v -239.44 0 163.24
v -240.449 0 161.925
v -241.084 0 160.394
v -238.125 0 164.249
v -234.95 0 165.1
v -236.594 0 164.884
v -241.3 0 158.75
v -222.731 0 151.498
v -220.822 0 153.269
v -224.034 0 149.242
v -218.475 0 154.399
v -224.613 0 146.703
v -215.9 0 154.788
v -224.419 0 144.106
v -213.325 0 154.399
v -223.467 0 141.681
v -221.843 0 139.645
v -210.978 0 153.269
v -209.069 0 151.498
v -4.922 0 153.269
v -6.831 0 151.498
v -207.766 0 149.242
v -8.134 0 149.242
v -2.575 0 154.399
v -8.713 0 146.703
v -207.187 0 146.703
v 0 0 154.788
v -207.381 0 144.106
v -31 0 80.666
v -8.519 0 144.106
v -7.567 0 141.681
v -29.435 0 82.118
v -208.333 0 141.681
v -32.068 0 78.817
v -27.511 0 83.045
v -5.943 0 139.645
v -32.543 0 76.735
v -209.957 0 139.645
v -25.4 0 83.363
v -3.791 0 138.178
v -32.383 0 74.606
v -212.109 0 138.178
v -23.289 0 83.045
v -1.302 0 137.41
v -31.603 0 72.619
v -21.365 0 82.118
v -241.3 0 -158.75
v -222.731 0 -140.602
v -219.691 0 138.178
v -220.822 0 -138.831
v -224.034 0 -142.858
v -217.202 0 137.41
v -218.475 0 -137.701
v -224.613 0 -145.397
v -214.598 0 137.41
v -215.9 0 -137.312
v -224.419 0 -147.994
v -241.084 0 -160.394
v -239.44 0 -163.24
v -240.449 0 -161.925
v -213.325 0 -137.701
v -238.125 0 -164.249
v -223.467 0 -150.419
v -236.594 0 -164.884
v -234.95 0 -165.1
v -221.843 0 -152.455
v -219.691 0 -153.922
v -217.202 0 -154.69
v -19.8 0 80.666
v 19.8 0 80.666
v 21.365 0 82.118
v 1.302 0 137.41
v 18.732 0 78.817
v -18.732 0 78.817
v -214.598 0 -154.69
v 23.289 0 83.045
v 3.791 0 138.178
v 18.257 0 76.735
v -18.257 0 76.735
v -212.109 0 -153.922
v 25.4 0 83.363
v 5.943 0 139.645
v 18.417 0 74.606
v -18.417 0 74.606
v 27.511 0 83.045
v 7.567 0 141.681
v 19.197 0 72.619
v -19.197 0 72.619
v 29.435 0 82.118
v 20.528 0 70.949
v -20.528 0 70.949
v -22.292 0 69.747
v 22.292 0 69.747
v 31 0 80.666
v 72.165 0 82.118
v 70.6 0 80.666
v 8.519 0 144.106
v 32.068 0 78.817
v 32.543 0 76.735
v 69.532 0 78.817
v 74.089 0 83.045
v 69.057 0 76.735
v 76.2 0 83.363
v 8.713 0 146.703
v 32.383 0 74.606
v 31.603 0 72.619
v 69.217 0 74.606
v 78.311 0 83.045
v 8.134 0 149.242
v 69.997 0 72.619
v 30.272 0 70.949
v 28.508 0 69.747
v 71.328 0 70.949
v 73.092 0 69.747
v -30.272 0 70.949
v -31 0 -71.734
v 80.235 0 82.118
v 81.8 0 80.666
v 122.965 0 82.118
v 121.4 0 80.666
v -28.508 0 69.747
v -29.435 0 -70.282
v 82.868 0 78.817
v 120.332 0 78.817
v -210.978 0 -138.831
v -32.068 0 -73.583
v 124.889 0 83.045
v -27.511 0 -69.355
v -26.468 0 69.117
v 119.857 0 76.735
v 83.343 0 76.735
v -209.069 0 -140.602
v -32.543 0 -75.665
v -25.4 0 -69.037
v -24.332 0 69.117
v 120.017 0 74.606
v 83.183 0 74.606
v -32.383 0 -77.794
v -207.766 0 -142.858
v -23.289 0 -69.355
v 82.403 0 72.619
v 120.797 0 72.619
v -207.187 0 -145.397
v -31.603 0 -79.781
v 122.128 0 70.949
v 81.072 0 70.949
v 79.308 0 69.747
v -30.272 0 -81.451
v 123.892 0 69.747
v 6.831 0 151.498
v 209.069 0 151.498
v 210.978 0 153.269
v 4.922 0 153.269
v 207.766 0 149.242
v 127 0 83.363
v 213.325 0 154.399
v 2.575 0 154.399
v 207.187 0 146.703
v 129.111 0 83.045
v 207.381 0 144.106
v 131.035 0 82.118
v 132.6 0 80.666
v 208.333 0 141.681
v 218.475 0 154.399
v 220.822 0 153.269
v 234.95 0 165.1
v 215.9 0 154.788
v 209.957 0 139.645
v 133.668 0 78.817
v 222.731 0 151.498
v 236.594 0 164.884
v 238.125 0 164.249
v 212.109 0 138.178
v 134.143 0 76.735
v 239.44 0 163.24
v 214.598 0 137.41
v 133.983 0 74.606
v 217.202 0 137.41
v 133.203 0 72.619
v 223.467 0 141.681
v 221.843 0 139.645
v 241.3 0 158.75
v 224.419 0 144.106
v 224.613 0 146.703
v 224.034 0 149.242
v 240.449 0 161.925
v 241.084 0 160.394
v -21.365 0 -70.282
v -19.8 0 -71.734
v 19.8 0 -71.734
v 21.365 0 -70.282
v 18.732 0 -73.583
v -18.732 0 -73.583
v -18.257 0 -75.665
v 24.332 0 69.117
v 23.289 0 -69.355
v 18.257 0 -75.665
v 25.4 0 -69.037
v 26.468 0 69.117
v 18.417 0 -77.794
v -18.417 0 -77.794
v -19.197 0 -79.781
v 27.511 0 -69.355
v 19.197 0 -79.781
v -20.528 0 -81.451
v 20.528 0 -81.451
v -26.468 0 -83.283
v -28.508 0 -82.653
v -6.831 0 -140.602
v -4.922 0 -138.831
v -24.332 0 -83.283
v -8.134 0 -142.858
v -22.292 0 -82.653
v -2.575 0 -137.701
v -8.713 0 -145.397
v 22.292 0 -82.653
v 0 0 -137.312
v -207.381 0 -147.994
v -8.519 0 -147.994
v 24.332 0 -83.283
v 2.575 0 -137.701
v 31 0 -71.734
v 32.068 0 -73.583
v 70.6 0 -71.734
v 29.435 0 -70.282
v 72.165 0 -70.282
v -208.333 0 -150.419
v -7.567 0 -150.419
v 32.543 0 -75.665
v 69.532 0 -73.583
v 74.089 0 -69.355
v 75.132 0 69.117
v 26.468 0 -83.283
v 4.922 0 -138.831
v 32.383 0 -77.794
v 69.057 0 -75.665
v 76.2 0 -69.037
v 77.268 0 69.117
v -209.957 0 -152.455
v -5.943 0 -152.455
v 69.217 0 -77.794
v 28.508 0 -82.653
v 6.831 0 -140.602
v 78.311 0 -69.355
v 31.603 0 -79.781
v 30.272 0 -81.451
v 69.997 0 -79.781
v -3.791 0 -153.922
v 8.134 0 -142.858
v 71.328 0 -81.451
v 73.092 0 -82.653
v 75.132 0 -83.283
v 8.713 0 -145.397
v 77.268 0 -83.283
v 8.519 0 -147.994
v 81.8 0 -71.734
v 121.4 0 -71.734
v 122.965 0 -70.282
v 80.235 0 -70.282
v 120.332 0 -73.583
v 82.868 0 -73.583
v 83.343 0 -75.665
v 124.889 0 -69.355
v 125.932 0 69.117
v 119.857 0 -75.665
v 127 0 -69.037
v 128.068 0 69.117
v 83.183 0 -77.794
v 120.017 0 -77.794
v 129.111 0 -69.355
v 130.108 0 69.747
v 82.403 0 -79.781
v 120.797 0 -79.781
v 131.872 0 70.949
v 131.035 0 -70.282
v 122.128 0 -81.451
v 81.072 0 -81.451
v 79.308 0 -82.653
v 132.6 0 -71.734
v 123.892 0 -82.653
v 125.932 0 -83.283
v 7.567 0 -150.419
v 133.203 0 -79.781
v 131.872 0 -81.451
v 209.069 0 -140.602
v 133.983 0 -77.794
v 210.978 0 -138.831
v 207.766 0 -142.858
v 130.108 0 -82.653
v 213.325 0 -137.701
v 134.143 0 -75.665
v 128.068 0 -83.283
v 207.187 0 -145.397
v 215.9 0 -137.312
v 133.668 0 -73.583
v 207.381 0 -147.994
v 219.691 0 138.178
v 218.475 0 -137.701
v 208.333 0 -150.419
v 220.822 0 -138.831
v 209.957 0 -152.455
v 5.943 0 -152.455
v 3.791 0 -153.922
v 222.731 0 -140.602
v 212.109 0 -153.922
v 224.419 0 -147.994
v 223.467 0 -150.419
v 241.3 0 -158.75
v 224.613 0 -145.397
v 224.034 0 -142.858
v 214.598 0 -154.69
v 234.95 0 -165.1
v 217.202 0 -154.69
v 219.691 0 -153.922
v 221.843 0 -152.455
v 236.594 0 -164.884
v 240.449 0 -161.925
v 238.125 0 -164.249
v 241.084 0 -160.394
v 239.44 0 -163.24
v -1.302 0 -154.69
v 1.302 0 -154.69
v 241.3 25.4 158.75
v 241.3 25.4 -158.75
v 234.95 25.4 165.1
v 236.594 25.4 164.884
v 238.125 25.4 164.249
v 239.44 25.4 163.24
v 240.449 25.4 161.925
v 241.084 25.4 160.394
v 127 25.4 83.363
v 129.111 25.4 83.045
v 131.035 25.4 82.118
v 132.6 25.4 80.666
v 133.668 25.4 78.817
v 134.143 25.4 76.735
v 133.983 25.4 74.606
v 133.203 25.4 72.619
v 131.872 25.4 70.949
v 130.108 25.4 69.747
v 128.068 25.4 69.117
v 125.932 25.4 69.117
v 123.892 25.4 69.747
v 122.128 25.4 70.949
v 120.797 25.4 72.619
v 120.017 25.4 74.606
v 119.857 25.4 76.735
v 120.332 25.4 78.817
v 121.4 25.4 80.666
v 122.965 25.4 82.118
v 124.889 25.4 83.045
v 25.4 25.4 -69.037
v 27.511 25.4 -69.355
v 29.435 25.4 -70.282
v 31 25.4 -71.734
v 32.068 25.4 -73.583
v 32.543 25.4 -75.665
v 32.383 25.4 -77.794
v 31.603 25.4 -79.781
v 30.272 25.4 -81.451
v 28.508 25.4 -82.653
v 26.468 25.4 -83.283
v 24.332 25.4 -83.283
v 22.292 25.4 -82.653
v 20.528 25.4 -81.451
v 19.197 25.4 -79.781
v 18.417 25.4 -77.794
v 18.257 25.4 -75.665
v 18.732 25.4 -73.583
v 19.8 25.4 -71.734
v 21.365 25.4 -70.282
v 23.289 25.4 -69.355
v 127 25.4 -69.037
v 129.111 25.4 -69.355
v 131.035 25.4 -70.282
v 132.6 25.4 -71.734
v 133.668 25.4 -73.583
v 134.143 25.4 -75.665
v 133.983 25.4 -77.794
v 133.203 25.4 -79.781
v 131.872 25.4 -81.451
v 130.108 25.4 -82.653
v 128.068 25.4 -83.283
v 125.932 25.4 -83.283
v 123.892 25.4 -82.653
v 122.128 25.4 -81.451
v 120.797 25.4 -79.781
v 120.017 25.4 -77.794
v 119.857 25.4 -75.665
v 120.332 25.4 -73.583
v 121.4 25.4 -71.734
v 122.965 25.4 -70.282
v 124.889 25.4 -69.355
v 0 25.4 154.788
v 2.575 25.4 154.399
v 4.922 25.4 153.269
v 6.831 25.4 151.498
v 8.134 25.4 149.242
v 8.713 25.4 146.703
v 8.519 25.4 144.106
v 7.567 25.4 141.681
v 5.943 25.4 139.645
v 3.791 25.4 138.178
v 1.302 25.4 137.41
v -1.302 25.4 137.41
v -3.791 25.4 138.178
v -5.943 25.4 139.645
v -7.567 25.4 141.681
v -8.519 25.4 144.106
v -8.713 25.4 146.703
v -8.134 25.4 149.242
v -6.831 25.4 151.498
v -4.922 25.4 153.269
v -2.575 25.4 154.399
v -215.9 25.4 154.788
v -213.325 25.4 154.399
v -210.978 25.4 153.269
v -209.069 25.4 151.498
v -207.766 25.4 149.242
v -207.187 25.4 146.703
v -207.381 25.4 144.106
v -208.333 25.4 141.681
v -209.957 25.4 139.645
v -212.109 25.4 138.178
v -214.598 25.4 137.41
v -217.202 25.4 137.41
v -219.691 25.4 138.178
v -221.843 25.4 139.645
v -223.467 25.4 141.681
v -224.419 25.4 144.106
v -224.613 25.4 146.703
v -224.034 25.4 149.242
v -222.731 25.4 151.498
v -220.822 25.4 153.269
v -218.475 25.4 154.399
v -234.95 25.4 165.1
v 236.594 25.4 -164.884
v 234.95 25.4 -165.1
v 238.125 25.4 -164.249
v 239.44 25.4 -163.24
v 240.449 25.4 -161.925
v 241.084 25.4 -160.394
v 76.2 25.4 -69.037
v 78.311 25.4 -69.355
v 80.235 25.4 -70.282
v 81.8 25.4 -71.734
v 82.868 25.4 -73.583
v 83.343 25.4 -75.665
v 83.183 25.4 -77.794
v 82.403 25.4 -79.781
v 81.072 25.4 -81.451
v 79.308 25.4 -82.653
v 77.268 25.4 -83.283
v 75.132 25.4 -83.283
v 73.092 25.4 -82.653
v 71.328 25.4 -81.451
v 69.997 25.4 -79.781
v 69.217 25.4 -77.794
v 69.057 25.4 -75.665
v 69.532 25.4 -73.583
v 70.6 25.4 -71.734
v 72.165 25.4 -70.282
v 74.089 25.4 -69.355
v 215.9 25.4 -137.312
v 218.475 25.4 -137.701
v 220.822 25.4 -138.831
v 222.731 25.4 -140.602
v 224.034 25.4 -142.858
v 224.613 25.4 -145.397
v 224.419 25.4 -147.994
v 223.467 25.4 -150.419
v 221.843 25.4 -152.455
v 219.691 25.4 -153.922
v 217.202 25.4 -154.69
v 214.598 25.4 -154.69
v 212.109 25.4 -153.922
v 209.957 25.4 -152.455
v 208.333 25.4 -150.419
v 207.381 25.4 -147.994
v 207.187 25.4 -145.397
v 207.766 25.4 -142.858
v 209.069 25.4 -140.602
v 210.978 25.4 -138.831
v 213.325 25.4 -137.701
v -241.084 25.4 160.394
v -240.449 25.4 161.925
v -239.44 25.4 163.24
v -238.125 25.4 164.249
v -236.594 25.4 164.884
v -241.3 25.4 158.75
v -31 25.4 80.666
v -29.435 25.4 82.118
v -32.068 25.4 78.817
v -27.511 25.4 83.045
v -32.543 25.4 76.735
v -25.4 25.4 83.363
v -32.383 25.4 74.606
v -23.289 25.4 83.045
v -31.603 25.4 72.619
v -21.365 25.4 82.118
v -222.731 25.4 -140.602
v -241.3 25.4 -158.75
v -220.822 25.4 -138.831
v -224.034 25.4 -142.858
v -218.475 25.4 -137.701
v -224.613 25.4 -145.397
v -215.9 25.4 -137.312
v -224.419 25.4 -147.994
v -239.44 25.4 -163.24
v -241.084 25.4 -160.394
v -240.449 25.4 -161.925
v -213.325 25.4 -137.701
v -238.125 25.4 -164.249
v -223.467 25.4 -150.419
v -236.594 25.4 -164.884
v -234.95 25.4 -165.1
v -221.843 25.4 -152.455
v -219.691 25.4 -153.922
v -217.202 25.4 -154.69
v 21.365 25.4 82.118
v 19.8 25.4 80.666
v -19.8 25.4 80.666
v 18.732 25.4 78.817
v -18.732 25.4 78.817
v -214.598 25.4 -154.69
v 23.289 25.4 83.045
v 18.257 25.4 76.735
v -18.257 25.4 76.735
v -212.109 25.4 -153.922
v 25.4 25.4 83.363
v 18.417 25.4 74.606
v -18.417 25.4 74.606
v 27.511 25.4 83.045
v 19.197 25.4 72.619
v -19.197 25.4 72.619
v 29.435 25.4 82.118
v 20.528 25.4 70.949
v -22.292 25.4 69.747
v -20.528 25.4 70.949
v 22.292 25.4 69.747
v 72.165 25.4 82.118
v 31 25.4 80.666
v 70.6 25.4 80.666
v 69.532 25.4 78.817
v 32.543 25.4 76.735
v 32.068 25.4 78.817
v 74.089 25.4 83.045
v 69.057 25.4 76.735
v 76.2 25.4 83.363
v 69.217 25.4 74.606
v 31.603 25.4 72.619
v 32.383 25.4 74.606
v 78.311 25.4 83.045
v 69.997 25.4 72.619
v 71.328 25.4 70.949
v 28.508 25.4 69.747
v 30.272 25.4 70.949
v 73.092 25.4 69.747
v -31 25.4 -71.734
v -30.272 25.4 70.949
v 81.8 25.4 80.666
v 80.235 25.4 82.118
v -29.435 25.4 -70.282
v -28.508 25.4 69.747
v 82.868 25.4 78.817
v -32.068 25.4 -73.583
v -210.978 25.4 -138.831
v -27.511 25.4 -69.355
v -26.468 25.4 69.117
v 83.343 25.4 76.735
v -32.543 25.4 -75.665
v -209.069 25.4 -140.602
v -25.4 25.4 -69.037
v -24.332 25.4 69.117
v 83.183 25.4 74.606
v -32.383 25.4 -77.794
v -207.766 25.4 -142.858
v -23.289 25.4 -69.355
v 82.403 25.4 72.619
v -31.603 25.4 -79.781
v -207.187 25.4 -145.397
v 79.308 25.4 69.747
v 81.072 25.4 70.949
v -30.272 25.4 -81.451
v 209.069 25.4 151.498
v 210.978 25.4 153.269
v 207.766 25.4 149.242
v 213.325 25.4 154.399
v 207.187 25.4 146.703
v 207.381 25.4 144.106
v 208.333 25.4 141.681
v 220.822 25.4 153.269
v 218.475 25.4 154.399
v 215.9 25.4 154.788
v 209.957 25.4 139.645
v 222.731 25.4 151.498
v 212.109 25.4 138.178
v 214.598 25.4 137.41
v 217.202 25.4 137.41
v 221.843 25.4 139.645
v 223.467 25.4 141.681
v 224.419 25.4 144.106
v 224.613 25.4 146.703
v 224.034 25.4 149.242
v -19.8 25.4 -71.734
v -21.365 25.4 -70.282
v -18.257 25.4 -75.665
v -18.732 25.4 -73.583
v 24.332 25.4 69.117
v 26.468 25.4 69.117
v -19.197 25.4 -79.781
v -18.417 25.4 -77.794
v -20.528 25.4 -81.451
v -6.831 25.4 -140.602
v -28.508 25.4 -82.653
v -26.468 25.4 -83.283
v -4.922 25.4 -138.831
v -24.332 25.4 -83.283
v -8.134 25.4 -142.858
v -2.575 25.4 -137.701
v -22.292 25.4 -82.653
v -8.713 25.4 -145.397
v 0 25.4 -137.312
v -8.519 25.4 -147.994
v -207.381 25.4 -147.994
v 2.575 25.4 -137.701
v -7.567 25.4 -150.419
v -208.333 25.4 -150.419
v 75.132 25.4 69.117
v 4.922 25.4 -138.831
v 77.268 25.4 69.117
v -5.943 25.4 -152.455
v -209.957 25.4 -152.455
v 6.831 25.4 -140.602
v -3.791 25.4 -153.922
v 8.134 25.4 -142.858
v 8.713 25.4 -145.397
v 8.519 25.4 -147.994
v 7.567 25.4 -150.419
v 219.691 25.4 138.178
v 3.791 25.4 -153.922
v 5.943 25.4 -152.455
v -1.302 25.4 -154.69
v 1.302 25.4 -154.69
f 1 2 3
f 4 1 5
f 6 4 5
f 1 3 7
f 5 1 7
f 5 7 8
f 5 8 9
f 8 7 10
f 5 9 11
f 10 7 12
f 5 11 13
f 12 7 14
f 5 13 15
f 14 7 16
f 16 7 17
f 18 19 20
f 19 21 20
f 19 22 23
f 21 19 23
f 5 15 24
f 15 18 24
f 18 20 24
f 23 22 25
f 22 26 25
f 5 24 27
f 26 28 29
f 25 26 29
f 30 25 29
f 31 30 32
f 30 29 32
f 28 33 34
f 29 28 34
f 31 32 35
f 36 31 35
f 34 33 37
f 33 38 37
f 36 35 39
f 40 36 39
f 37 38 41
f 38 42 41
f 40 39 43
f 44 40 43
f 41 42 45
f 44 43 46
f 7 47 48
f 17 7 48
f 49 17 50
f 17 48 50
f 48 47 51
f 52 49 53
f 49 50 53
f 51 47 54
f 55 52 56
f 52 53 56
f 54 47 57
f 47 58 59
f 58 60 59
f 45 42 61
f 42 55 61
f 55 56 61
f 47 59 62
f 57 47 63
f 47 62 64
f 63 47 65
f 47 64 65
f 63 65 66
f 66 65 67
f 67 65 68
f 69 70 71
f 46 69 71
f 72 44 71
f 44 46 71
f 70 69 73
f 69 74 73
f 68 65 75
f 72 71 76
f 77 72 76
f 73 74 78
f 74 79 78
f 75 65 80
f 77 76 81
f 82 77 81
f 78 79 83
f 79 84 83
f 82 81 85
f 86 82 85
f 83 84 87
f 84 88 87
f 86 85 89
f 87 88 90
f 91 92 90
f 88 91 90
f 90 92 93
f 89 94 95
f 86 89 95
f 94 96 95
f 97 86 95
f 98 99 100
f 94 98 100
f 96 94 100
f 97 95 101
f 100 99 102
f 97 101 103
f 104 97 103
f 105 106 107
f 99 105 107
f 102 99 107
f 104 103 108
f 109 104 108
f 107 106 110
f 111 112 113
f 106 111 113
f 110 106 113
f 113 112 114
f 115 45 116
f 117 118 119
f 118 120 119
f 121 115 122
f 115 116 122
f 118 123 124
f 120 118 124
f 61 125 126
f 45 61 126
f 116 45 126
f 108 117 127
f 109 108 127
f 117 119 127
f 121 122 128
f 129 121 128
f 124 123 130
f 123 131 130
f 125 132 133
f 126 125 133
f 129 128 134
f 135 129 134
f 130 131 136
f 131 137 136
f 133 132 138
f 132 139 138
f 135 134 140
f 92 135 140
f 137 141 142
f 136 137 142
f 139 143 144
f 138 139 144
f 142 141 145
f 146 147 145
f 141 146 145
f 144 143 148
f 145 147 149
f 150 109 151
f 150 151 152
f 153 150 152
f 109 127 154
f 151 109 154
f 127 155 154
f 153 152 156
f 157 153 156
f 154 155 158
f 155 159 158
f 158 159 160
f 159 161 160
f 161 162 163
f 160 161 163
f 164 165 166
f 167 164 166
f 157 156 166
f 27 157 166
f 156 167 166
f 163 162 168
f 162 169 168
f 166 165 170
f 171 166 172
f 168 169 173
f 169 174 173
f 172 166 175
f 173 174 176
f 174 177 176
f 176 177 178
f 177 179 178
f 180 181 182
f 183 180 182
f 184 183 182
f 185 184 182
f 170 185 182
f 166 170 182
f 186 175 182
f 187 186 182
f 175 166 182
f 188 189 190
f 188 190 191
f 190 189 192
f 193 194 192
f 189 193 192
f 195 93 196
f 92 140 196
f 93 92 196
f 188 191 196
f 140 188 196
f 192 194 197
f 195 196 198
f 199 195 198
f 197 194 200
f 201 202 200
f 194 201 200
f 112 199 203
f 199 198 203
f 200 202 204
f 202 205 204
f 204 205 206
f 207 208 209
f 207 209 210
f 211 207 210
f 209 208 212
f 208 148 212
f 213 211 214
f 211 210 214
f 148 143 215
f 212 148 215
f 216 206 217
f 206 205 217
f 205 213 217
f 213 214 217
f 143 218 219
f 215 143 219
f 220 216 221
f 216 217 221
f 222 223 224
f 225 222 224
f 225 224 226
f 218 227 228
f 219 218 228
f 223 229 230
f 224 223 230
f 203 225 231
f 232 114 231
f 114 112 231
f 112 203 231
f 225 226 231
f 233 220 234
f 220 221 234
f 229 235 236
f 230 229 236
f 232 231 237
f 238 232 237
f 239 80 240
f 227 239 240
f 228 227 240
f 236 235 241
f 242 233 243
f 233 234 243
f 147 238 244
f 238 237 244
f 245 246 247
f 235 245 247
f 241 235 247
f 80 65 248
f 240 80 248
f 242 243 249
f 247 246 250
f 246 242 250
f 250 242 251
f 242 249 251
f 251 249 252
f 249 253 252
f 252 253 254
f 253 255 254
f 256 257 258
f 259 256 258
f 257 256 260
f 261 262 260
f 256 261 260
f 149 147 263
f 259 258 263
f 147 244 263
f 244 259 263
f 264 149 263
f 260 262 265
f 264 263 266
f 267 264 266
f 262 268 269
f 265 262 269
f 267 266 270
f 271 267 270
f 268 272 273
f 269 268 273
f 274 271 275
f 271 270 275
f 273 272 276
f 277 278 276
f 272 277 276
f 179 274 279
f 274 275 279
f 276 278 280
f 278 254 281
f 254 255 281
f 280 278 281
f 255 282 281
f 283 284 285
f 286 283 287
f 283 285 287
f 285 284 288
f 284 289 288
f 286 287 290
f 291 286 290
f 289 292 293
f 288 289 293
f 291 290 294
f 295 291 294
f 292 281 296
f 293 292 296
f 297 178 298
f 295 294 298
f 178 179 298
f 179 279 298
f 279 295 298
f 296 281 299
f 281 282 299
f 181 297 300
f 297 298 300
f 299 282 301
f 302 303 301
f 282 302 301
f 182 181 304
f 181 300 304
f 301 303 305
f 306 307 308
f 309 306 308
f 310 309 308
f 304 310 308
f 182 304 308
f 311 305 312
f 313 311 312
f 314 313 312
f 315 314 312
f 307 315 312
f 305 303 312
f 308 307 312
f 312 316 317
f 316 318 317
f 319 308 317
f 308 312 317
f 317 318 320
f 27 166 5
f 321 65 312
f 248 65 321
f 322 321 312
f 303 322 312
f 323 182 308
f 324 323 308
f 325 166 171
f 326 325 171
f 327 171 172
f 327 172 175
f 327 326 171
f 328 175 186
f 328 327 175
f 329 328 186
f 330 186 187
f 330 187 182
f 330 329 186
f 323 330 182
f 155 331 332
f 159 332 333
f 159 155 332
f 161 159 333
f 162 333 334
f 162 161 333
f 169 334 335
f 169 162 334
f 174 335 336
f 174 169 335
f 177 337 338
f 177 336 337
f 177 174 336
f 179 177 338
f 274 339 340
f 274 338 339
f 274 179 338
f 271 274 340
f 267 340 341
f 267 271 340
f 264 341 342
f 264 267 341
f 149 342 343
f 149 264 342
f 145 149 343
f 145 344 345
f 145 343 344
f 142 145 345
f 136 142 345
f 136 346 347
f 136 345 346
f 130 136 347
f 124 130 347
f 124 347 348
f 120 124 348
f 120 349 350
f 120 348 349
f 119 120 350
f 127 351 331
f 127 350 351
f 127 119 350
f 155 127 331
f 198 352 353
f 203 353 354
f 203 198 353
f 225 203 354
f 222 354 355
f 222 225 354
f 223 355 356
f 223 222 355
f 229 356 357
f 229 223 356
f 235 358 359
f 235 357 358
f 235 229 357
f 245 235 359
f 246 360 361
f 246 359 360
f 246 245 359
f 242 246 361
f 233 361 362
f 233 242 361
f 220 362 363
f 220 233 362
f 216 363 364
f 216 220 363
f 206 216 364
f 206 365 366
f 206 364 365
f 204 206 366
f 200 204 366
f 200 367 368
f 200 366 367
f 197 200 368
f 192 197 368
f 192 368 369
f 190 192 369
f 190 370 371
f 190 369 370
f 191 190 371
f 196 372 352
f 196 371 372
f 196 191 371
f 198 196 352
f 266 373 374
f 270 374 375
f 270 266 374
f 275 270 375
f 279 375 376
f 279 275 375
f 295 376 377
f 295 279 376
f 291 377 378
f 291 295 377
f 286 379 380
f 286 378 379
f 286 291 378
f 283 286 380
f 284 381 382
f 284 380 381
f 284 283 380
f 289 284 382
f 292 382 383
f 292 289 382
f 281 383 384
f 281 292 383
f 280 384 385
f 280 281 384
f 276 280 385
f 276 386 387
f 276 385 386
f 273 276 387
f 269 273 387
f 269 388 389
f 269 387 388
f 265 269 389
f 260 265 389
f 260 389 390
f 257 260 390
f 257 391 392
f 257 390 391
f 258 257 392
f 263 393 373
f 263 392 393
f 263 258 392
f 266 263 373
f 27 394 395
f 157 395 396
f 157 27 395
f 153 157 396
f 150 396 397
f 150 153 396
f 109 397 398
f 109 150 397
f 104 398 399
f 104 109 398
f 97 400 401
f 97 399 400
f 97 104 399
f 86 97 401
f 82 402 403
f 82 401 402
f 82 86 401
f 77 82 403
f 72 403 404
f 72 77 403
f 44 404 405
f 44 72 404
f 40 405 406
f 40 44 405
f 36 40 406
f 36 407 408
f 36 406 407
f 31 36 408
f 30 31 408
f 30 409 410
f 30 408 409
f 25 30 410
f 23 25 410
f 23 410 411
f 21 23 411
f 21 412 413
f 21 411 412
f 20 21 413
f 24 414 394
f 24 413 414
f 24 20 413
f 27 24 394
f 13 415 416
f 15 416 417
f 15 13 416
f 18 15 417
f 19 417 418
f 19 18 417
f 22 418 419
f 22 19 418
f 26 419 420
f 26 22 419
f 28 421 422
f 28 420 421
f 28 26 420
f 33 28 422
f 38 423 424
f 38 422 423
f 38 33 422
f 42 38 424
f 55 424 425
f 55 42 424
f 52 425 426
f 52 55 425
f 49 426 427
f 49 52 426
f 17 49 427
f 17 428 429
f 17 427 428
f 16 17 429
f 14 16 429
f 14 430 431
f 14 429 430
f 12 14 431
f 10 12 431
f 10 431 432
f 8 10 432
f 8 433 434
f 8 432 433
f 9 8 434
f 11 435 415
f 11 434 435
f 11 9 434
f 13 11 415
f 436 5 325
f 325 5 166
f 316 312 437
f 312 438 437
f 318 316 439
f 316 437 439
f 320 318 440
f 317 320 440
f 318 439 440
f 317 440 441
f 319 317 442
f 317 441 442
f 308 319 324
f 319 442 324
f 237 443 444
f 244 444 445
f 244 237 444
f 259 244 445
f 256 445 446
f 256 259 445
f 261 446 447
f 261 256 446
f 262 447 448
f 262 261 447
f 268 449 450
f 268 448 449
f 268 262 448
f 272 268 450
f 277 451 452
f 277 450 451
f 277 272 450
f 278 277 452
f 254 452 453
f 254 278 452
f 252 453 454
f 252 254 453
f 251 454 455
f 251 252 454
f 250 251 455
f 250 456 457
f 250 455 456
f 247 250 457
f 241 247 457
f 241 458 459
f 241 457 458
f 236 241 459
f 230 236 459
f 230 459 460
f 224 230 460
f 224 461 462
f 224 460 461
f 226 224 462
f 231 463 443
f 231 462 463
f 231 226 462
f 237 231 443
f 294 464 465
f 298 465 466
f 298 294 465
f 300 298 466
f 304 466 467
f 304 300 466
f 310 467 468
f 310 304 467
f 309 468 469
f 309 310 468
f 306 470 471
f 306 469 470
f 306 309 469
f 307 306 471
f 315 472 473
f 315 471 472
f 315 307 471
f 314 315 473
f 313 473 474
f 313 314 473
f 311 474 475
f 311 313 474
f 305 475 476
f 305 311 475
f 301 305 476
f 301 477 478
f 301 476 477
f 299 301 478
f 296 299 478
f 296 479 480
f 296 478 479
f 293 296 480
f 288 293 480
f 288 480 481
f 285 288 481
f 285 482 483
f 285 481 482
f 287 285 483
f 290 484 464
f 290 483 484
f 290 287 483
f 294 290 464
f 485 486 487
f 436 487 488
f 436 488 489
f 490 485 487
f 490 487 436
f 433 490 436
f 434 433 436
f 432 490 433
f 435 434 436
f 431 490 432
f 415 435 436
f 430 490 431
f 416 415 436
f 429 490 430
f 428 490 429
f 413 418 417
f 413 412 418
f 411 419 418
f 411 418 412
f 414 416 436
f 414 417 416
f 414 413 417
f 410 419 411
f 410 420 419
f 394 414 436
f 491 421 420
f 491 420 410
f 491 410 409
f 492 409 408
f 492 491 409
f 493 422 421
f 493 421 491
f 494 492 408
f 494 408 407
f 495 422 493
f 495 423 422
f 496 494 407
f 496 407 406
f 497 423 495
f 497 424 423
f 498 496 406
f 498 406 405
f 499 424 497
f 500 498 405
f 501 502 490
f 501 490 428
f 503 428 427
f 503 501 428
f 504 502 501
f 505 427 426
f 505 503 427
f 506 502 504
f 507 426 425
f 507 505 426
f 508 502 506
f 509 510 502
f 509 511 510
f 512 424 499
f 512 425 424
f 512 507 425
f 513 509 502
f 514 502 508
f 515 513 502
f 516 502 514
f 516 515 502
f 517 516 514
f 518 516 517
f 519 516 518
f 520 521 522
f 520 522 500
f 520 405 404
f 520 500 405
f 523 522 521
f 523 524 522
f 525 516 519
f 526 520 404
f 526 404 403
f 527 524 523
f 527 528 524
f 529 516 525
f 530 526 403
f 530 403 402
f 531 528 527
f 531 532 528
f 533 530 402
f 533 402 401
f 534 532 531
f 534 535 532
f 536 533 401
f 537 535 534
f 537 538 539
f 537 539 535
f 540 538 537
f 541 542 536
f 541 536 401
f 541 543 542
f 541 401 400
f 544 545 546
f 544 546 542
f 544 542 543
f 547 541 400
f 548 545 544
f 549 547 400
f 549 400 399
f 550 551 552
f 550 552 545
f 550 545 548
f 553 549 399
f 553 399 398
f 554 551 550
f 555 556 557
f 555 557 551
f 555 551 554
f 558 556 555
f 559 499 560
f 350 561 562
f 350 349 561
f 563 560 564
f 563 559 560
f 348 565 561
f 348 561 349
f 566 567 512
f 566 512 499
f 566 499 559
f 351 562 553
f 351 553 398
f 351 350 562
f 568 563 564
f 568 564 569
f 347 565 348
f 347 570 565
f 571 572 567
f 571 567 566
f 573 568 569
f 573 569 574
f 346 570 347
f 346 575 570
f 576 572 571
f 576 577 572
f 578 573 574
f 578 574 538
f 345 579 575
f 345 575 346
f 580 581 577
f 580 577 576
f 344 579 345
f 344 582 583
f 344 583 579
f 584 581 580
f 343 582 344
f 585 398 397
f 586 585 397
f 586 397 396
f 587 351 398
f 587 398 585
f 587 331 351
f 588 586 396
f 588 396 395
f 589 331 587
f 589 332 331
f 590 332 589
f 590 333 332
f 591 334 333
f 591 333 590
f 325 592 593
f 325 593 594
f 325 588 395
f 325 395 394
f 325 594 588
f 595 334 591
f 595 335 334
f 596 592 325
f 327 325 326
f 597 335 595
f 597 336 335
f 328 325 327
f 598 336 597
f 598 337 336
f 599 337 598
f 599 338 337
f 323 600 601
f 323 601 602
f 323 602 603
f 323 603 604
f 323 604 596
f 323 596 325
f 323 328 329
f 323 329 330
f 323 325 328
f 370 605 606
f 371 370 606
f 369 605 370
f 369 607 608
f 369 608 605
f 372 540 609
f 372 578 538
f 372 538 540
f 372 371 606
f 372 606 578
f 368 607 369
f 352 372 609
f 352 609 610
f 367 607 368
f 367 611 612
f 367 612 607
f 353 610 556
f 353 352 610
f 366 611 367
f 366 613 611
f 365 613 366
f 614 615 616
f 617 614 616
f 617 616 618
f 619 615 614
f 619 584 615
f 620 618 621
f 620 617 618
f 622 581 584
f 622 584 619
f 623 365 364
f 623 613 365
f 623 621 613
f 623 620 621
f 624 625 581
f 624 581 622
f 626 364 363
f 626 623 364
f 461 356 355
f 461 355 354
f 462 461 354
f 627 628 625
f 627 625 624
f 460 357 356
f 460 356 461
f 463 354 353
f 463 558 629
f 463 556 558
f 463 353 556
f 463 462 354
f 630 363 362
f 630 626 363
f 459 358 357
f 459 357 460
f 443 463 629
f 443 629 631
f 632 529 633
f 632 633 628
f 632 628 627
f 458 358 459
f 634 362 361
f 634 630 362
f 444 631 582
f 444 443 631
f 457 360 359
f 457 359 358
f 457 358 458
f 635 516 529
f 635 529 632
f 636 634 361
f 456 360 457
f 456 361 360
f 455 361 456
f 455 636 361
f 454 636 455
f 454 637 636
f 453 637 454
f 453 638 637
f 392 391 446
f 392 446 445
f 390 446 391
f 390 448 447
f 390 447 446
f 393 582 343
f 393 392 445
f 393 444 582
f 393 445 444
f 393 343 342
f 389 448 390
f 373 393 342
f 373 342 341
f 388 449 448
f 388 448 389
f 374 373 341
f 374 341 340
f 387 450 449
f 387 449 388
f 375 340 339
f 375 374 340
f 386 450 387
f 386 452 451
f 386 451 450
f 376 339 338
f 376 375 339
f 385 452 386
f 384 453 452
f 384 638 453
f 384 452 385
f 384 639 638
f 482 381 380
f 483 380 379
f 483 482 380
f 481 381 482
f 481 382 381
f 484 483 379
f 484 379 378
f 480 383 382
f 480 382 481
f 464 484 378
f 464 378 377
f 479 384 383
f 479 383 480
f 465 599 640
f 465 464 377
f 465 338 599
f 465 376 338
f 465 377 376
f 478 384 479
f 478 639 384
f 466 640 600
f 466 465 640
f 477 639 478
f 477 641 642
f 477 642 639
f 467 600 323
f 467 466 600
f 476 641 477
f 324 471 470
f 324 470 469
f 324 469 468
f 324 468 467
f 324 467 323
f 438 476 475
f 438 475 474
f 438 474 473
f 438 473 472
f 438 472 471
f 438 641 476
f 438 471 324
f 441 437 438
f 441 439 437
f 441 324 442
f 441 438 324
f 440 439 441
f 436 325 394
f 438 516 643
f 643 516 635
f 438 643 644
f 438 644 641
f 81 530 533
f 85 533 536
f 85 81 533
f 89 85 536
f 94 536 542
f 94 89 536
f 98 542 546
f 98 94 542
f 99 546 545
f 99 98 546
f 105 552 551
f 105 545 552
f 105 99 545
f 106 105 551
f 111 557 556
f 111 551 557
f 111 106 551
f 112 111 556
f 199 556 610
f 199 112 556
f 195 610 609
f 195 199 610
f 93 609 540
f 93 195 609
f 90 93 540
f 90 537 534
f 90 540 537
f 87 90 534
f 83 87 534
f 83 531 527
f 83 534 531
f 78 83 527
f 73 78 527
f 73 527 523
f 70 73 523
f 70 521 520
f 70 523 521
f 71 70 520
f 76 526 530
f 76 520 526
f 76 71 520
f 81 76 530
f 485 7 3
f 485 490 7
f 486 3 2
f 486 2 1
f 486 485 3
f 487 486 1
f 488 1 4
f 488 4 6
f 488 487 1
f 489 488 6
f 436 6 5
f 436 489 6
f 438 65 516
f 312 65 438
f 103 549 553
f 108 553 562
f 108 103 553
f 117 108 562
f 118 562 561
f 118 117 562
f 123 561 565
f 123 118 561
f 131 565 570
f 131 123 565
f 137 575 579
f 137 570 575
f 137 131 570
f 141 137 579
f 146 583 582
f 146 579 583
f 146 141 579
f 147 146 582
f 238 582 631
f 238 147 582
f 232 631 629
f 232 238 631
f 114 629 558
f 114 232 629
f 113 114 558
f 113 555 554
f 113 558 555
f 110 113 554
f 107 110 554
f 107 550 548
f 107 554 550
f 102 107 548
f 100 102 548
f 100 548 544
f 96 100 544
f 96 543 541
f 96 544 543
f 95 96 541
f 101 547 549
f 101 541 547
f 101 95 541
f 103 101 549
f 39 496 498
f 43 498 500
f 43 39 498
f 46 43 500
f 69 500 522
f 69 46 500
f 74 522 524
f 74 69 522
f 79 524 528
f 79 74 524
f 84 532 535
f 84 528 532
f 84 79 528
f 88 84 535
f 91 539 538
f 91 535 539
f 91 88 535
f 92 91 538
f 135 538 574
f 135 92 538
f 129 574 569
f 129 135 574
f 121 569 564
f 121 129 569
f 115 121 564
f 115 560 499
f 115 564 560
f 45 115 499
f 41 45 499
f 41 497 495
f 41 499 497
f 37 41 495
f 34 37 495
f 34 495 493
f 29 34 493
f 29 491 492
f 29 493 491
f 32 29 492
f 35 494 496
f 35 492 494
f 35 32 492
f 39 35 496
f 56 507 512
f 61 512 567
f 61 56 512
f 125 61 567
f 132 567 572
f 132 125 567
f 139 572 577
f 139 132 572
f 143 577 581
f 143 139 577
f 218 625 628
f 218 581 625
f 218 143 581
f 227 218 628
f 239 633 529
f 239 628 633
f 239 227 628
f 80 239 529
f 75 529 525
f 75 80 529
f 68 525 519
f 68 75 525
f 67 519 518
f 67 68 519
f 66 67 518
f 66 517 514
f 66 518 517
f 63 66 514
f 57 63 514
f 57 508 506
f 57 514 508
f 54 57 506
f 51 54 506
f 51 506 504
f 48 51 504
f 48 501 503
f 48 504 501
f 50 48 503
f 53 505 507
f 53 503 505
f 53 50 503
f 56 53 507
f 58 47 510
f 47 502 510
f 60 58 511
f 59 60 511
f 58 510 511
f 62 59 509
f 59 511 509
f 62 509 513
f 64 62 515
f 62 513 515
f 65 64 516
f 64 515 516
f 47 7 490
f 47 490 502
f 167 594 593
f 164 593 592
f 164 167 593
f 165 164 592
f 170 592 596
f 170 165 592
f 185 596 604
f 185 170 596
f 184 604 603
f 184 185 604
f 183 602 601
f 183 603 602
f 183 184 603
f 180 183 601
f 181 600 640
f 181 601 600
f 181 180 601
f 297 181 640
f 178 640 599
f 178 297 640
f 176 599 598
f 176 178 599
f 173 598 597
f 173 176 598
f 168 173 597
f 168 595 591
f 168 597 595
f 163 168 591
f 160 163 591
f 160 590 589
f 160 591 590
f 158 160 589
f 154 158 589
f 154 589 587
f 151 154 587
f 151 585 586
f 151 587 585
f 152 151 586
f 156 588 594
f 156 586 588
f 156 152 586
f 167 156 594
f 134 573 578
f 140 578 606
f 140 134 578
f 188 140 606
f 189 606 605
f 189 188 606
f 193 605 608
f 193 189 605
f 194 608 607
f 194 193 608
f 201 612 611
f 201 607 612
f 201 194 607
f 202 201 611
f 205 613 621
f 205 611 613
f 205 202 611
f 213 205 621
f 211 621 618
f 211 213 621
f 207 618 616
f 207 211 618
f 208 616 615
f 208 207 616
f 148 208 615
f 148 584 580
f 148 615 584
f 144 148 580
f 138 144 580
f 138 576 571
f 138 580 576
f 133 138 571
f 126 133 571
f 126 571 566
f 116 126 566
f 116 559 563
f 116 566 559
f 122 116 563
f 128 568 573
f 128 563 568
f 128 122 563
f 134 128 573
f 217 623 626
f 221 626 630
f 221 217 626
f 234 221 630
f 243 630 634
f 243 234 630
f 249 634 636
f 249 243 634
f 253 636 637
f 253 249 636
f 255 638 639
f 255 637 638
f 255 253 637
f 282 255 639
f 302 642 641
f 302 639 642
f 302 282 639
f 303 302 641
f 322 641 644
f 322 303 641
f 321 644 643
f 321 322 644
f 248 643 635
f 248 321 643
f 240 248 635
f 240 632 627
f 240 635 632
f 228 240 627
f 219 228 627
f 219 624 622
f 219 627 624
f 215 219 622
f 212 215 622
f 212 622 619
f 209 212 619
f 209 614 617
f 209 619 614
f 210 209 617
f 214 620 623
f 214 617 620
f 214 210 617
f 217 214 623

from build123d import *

# Parameters (mm, degrees)
SKETCH1_W               = 482.6
SKETCH1_H               = 330.2
BOSS_EXTRUDE1_DEPTH     = 25.4
CUT_EXTRUDE1_DEPTH      = 294.477188211
CUT_EXTRUDE1_DEPTH_BACK = 294.477188211
SKETCH2_R               = 8.7376
CUT_EXTRUDE2_DEPTH      = 294.477188211
CUT_EXTRUDE2_DEPTH_BACK = 294.477188211
SKETCH4_R               = 7.1628
FILLET1_R               = 6.35


with BuildPart() as part:
    # Sketch1 → Boss-Extrude1 (new body)
    with BuildSketch(Plane(origin=(0, 0, 0), x_dir=(1, 0, 0), z_dir=(0, 1, 0))):
        Rectangle(SKETCH1_W, SKETCH1_H)
    extrude(amount=BOSS_EXTRUDE1_DEPTH)

    # Sketch2 → Cut-Extrude1 (cut, two sides: drawn at the far end of the back side and taken through both)
    with BuildSketch(Plane(origin=(0, 25.4, 0), x_dir=(1, 0, 0), z_dir=(0, 1, 0)).offset(-CUT_EXTRUDE1_DEPTH_BACK)):
        with Locations(Location((215.9, 146.05, 0), (0, 0, 270))):
            Circle(SKETCH2_R)
        with Locations(Location((-215.9, 146.05, 0), (0, 0, 270))):
            Circle(SKETCH2_R)
        with Locations(Location((215.9, -146.05, 0), (0, 0, 270))):
            Circle(SKETCH2_R)
        with Locations(Location((-215.9, -146.05, 0), (0, 0, 270))):
            Circle(SKETCH2_R)
        with Locations(Location((0, 146.05, 0), (0, 0, 270))):
            Circle(SKETCH2_R)
        with Locations(Location((0, -146.05, 0), (0, 0, 270))):
            Circle(SKETCH2_R)
    extrude(amount=CUT_EXTRUDE1_DEPTH + CUT_EXTRUDE1_DEPTH_BACK, mode=Mode.SUBTRACT)

    # Sketch4 → Cut-Extrude2 (cut, two sides: drawn at the far end of the back side and taken through both)
    with BuildSketch(Plane(origin=(0, 25.4, 0), x_dir=(1, 0, 0), z_dir=(0, 1, 0)).offset(-CUT_EXTRUDE2_DEPTH_BACK)):
        with Locations(Location((-25.4, 76.2, 0), (0, 0, 270))):
            Circle(SKETCH4_R)
        with Locations(Location((25.4, 76.2, 0), (0, 0, 270))):
            Circle(SKETCH4_R)
        with Locations(Location((76.2, 76.2, 0), (0, 0, 270))):
            Circle(SKETCH4_R)
        with Locations(Location((127, 76.2, 0), (0, 0, 270))):
            Circle(SKETCH4_R)
        with Locations(Location((127, -76.2, 0), (0, 0, 270))):
            Circle(SKETCH4_R)
        with Locations(Location((76.2, -76.2, 0), (0, 0, 270))):
            Circle(SKETCH4_R)
        with Locations(Location((25.4, -76.2, 0), (0, 0, 270))):
            Circle(SKETCH4_R)
        with Locations(Location((-25.4, -76.2, 0), (0, 0, 270))):
            Circle(SKETCH4_R)
    extrude(amount=CUT_EXTRUDE2_DEPTH + CUT_EXTRUDE2_DEPTH_BACK, mode=Mode.SUBTRACT)

    # Fillet1
    fillet1_edges = [part.edges().sort_by_distance(p)[0] for p in [
        (241.3, 12.7, 165.1),
        (-241.3, 12.7, 165.1),
        (-241.3, 12.7, -165.1),
        (241.3, 12.7, -165.1),
    ]]
    fillet(fillet1_edges, radius=FILLET1_R)


solid = part.part
